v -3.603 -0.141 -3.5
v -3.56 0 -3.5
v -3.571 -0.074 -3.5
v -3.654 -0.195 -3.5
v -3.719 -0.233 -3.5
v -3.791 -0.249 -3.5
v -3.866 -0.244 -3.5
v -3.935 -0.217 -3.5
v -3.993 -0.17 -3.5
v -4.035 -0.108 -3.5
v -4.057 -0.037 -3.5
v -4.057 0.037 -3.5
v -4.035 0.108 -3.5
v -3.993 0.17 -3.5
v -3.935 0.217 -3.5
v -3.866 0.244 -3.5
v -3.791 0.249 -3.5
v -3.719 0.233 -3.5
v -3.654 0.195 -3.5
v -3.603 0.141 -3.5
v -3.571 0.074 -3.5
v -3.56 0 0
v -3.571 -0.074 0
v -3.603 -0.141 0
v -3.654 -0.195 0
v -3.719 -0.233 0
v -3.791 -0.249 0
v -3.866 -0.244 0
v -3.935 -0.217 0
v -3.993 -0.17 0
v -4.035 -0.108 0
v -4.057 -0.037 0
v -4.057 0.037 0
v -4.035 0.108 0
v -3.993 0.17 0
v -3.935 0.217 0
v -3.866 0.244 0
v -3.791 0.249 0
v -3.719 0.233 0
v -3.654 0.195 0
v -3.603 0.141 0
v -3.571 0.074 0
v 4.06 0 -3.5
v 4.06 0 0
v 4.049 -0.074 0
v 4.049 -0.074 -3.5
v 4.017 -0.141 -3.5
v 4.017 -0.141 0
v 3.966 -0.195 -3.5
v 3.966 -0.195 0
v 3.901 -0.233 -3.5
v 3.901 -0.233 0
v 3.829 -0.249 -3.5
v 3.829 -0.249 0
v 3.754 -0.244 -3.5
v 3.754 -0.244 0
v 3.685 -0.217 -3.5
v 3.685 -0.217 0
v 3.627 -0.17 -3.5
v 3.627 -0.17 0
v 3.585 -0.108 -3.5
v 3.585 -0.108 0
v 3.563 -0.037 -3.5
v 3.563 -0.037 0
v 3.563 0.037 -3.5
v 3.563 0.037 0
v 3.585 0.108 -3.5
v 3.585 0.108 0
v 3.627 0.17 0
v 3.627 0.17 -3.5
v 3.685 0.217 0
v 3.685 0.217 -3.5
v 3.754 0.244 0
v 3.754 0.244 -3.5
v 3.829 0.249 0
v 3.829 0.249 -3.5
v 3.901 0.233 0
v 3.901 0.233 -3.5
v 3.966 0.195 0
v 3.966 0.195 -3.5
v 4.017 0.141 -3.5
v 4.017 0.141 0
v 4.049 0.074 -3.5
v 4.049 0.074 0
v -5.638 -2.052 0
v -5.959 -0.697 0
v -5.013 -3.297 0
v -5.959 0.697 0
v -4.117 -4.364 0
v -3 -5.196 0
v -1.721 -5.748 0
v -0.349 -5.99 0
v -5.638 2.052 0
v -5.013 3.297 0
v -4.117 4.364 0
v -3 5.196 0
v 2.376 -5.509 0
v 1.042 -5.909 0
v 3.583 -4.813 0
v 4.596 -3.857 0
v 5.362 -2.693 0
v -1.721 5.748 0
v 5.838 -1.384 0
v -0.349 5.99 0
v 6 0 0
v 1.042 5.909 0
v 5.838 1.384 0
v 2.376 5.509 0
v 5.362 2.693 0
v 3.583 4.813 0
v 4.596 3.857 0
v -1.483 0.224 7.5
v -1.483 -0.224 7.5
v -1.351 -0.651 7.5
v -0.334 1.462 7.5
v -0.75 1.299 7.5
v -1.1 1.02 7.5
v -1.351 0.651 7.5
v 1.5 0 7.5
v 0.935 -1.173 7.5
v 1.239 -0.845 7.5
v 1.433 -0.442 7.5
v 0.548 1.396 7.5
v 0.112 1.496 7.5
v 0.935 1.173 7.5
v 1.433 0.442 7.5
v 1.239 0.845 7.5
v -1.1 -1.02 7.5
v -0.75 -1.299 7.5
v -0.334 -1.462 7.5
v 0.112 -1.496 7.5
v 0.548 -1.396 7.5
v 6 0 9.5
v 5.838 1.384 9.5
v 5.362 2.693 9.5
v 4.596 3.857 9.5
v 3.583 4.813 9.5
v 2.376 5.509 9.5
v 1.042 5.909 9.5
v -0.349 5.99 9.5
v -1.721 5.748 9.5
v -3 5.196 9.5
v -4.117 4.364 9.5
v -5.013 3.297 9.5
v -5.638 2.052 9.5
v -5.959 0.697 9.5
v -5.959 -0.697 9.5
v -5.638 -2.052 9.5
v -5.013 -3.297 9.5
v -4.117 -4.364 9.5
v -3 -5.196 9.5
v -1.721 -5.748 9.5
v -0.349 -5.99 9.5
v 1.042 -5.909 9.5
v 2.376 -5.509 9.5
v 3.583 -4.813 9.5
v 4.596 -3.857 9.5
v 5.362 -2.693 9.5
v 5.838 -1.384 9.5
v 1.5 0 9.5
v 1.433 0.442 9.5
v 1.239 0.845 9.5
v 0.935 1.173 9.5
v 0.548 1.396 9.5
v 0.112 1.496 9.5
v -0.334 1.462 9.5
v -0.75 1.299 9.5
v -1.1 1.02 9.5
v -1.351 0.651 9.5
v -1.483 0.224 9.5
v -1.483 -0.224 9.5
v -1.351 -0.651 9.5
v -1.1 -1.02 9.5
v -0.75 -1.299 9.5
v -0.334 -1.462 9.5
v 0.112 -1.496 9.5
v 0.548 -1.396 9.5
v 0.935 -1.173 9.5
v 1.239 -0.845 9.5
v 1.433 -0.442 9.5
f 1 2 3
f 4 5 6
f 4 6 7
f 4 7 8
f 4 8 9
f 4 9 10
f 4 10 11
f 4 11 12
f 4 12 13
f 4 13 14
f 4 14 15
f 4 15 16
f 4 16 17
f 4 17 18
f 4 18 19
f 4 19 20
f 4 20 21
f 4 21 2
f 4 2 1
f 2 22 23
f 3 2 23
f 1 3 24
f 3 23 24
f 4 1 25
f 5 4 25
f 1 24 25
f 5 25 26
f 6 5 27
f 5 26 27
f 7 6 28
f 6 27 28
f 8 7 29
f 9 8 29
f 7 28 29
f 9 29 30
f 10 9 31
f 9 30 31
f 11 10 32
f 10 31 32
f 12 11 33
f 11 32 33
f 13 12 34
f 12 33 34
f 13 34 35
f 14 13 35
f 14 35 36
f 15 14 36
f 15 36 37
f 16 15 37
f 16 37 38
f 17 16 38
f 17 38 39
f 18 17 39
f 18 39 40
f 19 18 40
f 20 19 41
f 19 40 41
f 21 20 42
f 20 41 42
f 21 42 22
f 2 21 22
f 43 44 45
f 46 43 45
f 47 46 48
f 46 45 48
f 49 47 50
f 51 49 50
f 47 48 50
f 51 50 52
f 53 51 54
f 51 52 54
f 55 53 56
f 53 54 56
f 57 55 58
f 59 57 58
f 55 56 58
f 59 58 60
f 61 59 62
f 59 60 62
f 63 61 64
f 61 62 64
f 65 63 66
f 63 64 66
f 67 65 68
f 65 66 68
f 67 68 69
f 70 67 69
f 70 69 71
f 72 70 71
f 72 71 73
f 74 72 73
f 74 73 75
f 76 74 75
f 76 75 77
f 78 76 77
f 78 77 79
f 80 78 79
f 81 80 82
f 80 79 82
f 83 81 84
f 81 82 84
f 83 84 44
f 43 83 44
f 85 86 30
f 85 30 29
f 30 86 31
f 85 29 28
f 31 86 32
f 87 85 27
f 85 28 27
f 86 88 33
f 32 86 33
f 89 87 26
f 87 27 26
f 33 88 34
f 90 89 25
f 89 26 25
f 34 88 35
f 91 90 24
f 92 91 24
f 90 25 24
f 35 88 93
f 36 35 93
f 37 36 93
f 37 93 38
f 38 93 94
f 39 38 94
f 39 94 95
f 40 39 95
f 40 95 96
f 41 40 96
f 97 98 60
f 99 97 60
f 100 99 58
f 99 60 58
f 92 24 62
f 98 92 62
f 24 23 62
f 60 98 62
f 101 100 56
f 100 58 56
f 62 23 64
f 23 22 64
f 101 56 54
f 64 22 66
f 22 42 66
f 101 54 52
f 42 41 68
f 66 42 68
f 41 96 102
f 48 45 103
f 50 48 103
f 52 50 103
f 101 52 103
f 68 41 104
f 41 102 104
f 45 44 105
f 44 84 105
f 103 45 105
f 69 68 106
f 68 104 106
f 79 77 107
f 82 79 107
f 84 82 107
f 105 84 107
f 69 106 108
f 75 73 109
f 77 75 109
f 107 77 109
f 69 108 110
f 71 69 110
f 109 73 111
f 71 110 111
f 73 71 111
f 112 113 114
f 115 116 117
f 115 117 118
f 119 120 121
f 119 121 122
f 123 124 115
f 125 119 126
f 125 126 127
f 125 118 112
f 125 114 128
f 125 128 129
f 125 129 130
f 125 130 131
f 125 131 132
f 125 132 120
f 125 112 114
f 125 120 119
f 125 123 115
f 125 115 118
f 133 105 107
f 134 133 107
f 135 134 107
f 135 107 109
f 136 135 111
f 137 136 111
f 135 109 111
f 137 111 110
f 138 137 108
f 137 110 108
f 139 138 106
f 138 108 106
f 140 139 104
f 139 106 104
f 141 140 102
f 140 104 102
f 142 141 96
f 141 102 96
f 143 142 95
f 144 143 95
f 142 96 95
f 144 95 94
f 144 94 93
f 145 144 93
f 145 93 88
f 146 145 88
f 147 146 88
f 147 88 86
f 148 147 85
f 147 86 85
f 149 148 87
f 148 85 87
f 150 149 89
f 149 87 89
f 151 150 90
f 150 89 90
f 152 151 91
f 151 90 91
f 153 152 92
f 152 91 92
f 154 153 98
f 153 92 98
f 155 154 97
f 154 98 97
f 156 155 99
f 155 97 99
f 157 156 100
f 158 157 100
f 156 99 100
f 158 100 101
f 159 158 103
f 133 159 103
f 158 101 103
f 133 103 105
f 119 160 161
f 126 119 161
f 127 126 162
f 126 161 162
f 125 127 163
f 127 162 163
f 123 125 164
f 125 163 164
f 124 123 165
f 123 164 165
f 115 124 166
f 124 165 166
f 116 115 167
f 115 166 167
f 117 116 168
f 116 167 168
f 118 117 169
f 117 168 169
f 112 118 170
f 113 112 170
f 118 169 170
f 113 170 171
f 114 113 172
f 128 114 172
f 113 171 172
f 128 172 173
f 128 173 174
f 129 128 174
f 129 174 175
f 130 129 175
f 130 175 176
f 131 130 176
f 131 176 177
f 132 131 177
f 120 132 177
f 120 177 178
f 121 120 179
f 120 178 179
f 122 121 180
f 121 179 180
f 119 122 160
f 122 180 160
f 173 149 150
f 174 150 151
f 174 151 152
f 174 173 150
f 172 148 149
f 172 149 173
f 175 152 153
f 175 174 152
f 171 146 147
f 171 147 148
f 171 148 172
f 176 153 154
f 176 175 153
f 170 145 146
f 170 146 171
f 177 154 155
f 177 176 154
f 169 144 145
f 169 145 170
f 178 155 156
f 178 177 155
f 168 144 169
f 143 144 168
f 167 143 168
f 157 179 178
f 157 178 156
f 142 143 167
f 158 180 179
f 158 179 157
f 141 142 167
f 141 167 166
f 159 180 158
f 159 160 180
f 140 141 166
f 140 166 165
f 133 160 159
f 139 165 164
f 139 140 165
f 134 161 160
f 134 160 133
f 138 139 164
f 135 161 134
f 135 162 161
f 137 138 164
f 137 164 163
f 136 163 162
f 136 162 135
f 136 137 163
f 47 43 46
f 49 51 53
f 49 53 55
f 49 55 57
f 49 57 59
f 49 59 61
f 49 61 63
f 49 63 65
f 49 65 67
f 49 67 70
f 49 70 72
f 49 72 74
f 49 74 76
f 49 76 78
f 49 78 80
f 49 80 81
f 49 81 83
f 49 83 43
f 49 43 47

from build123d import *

# Parameters (mm, degrees)
SKETCH_R     = 6
PAD_DEPTH    = 9.5
SKETCH001_R  = 1.5
POCKET_DEPTH = 2
SKETCH002_R  = 0.25
PAD001_DEPTH = 3.5


with BuildPart() as part:
    # Sketch → Pad (new body)
    with BuildSketch(Plane.XY):
        Circle(SKETCH_R)
    extrude(amount=PAD_DEPTH)

    # Sketch001 (on Face3 of Pad) → Pocket (cut)
    with BuildSketch(Plane.XY.offset(9.5)):
        Circle(SKETCH001_R)
    extrude(amount=-POCKET_DEPTH, mode=Mode.SUBTRACT)

    # Sketch002 (on Face2 of Pocket) → Pad001 (join)
    with BuildSketch(Plane(origin=(0, 0, 0), x_dir=(1, 0, 0), z_dir=(0, 0, -1))):
        with Locations((-3.81, 0)):
            Circle(SKETCH002_R)
        with Locations((3.81, 0)):
            Circle(SKETCH002_R)
    extrude(amount=PAD001_DEPTH)


solid = part.part
